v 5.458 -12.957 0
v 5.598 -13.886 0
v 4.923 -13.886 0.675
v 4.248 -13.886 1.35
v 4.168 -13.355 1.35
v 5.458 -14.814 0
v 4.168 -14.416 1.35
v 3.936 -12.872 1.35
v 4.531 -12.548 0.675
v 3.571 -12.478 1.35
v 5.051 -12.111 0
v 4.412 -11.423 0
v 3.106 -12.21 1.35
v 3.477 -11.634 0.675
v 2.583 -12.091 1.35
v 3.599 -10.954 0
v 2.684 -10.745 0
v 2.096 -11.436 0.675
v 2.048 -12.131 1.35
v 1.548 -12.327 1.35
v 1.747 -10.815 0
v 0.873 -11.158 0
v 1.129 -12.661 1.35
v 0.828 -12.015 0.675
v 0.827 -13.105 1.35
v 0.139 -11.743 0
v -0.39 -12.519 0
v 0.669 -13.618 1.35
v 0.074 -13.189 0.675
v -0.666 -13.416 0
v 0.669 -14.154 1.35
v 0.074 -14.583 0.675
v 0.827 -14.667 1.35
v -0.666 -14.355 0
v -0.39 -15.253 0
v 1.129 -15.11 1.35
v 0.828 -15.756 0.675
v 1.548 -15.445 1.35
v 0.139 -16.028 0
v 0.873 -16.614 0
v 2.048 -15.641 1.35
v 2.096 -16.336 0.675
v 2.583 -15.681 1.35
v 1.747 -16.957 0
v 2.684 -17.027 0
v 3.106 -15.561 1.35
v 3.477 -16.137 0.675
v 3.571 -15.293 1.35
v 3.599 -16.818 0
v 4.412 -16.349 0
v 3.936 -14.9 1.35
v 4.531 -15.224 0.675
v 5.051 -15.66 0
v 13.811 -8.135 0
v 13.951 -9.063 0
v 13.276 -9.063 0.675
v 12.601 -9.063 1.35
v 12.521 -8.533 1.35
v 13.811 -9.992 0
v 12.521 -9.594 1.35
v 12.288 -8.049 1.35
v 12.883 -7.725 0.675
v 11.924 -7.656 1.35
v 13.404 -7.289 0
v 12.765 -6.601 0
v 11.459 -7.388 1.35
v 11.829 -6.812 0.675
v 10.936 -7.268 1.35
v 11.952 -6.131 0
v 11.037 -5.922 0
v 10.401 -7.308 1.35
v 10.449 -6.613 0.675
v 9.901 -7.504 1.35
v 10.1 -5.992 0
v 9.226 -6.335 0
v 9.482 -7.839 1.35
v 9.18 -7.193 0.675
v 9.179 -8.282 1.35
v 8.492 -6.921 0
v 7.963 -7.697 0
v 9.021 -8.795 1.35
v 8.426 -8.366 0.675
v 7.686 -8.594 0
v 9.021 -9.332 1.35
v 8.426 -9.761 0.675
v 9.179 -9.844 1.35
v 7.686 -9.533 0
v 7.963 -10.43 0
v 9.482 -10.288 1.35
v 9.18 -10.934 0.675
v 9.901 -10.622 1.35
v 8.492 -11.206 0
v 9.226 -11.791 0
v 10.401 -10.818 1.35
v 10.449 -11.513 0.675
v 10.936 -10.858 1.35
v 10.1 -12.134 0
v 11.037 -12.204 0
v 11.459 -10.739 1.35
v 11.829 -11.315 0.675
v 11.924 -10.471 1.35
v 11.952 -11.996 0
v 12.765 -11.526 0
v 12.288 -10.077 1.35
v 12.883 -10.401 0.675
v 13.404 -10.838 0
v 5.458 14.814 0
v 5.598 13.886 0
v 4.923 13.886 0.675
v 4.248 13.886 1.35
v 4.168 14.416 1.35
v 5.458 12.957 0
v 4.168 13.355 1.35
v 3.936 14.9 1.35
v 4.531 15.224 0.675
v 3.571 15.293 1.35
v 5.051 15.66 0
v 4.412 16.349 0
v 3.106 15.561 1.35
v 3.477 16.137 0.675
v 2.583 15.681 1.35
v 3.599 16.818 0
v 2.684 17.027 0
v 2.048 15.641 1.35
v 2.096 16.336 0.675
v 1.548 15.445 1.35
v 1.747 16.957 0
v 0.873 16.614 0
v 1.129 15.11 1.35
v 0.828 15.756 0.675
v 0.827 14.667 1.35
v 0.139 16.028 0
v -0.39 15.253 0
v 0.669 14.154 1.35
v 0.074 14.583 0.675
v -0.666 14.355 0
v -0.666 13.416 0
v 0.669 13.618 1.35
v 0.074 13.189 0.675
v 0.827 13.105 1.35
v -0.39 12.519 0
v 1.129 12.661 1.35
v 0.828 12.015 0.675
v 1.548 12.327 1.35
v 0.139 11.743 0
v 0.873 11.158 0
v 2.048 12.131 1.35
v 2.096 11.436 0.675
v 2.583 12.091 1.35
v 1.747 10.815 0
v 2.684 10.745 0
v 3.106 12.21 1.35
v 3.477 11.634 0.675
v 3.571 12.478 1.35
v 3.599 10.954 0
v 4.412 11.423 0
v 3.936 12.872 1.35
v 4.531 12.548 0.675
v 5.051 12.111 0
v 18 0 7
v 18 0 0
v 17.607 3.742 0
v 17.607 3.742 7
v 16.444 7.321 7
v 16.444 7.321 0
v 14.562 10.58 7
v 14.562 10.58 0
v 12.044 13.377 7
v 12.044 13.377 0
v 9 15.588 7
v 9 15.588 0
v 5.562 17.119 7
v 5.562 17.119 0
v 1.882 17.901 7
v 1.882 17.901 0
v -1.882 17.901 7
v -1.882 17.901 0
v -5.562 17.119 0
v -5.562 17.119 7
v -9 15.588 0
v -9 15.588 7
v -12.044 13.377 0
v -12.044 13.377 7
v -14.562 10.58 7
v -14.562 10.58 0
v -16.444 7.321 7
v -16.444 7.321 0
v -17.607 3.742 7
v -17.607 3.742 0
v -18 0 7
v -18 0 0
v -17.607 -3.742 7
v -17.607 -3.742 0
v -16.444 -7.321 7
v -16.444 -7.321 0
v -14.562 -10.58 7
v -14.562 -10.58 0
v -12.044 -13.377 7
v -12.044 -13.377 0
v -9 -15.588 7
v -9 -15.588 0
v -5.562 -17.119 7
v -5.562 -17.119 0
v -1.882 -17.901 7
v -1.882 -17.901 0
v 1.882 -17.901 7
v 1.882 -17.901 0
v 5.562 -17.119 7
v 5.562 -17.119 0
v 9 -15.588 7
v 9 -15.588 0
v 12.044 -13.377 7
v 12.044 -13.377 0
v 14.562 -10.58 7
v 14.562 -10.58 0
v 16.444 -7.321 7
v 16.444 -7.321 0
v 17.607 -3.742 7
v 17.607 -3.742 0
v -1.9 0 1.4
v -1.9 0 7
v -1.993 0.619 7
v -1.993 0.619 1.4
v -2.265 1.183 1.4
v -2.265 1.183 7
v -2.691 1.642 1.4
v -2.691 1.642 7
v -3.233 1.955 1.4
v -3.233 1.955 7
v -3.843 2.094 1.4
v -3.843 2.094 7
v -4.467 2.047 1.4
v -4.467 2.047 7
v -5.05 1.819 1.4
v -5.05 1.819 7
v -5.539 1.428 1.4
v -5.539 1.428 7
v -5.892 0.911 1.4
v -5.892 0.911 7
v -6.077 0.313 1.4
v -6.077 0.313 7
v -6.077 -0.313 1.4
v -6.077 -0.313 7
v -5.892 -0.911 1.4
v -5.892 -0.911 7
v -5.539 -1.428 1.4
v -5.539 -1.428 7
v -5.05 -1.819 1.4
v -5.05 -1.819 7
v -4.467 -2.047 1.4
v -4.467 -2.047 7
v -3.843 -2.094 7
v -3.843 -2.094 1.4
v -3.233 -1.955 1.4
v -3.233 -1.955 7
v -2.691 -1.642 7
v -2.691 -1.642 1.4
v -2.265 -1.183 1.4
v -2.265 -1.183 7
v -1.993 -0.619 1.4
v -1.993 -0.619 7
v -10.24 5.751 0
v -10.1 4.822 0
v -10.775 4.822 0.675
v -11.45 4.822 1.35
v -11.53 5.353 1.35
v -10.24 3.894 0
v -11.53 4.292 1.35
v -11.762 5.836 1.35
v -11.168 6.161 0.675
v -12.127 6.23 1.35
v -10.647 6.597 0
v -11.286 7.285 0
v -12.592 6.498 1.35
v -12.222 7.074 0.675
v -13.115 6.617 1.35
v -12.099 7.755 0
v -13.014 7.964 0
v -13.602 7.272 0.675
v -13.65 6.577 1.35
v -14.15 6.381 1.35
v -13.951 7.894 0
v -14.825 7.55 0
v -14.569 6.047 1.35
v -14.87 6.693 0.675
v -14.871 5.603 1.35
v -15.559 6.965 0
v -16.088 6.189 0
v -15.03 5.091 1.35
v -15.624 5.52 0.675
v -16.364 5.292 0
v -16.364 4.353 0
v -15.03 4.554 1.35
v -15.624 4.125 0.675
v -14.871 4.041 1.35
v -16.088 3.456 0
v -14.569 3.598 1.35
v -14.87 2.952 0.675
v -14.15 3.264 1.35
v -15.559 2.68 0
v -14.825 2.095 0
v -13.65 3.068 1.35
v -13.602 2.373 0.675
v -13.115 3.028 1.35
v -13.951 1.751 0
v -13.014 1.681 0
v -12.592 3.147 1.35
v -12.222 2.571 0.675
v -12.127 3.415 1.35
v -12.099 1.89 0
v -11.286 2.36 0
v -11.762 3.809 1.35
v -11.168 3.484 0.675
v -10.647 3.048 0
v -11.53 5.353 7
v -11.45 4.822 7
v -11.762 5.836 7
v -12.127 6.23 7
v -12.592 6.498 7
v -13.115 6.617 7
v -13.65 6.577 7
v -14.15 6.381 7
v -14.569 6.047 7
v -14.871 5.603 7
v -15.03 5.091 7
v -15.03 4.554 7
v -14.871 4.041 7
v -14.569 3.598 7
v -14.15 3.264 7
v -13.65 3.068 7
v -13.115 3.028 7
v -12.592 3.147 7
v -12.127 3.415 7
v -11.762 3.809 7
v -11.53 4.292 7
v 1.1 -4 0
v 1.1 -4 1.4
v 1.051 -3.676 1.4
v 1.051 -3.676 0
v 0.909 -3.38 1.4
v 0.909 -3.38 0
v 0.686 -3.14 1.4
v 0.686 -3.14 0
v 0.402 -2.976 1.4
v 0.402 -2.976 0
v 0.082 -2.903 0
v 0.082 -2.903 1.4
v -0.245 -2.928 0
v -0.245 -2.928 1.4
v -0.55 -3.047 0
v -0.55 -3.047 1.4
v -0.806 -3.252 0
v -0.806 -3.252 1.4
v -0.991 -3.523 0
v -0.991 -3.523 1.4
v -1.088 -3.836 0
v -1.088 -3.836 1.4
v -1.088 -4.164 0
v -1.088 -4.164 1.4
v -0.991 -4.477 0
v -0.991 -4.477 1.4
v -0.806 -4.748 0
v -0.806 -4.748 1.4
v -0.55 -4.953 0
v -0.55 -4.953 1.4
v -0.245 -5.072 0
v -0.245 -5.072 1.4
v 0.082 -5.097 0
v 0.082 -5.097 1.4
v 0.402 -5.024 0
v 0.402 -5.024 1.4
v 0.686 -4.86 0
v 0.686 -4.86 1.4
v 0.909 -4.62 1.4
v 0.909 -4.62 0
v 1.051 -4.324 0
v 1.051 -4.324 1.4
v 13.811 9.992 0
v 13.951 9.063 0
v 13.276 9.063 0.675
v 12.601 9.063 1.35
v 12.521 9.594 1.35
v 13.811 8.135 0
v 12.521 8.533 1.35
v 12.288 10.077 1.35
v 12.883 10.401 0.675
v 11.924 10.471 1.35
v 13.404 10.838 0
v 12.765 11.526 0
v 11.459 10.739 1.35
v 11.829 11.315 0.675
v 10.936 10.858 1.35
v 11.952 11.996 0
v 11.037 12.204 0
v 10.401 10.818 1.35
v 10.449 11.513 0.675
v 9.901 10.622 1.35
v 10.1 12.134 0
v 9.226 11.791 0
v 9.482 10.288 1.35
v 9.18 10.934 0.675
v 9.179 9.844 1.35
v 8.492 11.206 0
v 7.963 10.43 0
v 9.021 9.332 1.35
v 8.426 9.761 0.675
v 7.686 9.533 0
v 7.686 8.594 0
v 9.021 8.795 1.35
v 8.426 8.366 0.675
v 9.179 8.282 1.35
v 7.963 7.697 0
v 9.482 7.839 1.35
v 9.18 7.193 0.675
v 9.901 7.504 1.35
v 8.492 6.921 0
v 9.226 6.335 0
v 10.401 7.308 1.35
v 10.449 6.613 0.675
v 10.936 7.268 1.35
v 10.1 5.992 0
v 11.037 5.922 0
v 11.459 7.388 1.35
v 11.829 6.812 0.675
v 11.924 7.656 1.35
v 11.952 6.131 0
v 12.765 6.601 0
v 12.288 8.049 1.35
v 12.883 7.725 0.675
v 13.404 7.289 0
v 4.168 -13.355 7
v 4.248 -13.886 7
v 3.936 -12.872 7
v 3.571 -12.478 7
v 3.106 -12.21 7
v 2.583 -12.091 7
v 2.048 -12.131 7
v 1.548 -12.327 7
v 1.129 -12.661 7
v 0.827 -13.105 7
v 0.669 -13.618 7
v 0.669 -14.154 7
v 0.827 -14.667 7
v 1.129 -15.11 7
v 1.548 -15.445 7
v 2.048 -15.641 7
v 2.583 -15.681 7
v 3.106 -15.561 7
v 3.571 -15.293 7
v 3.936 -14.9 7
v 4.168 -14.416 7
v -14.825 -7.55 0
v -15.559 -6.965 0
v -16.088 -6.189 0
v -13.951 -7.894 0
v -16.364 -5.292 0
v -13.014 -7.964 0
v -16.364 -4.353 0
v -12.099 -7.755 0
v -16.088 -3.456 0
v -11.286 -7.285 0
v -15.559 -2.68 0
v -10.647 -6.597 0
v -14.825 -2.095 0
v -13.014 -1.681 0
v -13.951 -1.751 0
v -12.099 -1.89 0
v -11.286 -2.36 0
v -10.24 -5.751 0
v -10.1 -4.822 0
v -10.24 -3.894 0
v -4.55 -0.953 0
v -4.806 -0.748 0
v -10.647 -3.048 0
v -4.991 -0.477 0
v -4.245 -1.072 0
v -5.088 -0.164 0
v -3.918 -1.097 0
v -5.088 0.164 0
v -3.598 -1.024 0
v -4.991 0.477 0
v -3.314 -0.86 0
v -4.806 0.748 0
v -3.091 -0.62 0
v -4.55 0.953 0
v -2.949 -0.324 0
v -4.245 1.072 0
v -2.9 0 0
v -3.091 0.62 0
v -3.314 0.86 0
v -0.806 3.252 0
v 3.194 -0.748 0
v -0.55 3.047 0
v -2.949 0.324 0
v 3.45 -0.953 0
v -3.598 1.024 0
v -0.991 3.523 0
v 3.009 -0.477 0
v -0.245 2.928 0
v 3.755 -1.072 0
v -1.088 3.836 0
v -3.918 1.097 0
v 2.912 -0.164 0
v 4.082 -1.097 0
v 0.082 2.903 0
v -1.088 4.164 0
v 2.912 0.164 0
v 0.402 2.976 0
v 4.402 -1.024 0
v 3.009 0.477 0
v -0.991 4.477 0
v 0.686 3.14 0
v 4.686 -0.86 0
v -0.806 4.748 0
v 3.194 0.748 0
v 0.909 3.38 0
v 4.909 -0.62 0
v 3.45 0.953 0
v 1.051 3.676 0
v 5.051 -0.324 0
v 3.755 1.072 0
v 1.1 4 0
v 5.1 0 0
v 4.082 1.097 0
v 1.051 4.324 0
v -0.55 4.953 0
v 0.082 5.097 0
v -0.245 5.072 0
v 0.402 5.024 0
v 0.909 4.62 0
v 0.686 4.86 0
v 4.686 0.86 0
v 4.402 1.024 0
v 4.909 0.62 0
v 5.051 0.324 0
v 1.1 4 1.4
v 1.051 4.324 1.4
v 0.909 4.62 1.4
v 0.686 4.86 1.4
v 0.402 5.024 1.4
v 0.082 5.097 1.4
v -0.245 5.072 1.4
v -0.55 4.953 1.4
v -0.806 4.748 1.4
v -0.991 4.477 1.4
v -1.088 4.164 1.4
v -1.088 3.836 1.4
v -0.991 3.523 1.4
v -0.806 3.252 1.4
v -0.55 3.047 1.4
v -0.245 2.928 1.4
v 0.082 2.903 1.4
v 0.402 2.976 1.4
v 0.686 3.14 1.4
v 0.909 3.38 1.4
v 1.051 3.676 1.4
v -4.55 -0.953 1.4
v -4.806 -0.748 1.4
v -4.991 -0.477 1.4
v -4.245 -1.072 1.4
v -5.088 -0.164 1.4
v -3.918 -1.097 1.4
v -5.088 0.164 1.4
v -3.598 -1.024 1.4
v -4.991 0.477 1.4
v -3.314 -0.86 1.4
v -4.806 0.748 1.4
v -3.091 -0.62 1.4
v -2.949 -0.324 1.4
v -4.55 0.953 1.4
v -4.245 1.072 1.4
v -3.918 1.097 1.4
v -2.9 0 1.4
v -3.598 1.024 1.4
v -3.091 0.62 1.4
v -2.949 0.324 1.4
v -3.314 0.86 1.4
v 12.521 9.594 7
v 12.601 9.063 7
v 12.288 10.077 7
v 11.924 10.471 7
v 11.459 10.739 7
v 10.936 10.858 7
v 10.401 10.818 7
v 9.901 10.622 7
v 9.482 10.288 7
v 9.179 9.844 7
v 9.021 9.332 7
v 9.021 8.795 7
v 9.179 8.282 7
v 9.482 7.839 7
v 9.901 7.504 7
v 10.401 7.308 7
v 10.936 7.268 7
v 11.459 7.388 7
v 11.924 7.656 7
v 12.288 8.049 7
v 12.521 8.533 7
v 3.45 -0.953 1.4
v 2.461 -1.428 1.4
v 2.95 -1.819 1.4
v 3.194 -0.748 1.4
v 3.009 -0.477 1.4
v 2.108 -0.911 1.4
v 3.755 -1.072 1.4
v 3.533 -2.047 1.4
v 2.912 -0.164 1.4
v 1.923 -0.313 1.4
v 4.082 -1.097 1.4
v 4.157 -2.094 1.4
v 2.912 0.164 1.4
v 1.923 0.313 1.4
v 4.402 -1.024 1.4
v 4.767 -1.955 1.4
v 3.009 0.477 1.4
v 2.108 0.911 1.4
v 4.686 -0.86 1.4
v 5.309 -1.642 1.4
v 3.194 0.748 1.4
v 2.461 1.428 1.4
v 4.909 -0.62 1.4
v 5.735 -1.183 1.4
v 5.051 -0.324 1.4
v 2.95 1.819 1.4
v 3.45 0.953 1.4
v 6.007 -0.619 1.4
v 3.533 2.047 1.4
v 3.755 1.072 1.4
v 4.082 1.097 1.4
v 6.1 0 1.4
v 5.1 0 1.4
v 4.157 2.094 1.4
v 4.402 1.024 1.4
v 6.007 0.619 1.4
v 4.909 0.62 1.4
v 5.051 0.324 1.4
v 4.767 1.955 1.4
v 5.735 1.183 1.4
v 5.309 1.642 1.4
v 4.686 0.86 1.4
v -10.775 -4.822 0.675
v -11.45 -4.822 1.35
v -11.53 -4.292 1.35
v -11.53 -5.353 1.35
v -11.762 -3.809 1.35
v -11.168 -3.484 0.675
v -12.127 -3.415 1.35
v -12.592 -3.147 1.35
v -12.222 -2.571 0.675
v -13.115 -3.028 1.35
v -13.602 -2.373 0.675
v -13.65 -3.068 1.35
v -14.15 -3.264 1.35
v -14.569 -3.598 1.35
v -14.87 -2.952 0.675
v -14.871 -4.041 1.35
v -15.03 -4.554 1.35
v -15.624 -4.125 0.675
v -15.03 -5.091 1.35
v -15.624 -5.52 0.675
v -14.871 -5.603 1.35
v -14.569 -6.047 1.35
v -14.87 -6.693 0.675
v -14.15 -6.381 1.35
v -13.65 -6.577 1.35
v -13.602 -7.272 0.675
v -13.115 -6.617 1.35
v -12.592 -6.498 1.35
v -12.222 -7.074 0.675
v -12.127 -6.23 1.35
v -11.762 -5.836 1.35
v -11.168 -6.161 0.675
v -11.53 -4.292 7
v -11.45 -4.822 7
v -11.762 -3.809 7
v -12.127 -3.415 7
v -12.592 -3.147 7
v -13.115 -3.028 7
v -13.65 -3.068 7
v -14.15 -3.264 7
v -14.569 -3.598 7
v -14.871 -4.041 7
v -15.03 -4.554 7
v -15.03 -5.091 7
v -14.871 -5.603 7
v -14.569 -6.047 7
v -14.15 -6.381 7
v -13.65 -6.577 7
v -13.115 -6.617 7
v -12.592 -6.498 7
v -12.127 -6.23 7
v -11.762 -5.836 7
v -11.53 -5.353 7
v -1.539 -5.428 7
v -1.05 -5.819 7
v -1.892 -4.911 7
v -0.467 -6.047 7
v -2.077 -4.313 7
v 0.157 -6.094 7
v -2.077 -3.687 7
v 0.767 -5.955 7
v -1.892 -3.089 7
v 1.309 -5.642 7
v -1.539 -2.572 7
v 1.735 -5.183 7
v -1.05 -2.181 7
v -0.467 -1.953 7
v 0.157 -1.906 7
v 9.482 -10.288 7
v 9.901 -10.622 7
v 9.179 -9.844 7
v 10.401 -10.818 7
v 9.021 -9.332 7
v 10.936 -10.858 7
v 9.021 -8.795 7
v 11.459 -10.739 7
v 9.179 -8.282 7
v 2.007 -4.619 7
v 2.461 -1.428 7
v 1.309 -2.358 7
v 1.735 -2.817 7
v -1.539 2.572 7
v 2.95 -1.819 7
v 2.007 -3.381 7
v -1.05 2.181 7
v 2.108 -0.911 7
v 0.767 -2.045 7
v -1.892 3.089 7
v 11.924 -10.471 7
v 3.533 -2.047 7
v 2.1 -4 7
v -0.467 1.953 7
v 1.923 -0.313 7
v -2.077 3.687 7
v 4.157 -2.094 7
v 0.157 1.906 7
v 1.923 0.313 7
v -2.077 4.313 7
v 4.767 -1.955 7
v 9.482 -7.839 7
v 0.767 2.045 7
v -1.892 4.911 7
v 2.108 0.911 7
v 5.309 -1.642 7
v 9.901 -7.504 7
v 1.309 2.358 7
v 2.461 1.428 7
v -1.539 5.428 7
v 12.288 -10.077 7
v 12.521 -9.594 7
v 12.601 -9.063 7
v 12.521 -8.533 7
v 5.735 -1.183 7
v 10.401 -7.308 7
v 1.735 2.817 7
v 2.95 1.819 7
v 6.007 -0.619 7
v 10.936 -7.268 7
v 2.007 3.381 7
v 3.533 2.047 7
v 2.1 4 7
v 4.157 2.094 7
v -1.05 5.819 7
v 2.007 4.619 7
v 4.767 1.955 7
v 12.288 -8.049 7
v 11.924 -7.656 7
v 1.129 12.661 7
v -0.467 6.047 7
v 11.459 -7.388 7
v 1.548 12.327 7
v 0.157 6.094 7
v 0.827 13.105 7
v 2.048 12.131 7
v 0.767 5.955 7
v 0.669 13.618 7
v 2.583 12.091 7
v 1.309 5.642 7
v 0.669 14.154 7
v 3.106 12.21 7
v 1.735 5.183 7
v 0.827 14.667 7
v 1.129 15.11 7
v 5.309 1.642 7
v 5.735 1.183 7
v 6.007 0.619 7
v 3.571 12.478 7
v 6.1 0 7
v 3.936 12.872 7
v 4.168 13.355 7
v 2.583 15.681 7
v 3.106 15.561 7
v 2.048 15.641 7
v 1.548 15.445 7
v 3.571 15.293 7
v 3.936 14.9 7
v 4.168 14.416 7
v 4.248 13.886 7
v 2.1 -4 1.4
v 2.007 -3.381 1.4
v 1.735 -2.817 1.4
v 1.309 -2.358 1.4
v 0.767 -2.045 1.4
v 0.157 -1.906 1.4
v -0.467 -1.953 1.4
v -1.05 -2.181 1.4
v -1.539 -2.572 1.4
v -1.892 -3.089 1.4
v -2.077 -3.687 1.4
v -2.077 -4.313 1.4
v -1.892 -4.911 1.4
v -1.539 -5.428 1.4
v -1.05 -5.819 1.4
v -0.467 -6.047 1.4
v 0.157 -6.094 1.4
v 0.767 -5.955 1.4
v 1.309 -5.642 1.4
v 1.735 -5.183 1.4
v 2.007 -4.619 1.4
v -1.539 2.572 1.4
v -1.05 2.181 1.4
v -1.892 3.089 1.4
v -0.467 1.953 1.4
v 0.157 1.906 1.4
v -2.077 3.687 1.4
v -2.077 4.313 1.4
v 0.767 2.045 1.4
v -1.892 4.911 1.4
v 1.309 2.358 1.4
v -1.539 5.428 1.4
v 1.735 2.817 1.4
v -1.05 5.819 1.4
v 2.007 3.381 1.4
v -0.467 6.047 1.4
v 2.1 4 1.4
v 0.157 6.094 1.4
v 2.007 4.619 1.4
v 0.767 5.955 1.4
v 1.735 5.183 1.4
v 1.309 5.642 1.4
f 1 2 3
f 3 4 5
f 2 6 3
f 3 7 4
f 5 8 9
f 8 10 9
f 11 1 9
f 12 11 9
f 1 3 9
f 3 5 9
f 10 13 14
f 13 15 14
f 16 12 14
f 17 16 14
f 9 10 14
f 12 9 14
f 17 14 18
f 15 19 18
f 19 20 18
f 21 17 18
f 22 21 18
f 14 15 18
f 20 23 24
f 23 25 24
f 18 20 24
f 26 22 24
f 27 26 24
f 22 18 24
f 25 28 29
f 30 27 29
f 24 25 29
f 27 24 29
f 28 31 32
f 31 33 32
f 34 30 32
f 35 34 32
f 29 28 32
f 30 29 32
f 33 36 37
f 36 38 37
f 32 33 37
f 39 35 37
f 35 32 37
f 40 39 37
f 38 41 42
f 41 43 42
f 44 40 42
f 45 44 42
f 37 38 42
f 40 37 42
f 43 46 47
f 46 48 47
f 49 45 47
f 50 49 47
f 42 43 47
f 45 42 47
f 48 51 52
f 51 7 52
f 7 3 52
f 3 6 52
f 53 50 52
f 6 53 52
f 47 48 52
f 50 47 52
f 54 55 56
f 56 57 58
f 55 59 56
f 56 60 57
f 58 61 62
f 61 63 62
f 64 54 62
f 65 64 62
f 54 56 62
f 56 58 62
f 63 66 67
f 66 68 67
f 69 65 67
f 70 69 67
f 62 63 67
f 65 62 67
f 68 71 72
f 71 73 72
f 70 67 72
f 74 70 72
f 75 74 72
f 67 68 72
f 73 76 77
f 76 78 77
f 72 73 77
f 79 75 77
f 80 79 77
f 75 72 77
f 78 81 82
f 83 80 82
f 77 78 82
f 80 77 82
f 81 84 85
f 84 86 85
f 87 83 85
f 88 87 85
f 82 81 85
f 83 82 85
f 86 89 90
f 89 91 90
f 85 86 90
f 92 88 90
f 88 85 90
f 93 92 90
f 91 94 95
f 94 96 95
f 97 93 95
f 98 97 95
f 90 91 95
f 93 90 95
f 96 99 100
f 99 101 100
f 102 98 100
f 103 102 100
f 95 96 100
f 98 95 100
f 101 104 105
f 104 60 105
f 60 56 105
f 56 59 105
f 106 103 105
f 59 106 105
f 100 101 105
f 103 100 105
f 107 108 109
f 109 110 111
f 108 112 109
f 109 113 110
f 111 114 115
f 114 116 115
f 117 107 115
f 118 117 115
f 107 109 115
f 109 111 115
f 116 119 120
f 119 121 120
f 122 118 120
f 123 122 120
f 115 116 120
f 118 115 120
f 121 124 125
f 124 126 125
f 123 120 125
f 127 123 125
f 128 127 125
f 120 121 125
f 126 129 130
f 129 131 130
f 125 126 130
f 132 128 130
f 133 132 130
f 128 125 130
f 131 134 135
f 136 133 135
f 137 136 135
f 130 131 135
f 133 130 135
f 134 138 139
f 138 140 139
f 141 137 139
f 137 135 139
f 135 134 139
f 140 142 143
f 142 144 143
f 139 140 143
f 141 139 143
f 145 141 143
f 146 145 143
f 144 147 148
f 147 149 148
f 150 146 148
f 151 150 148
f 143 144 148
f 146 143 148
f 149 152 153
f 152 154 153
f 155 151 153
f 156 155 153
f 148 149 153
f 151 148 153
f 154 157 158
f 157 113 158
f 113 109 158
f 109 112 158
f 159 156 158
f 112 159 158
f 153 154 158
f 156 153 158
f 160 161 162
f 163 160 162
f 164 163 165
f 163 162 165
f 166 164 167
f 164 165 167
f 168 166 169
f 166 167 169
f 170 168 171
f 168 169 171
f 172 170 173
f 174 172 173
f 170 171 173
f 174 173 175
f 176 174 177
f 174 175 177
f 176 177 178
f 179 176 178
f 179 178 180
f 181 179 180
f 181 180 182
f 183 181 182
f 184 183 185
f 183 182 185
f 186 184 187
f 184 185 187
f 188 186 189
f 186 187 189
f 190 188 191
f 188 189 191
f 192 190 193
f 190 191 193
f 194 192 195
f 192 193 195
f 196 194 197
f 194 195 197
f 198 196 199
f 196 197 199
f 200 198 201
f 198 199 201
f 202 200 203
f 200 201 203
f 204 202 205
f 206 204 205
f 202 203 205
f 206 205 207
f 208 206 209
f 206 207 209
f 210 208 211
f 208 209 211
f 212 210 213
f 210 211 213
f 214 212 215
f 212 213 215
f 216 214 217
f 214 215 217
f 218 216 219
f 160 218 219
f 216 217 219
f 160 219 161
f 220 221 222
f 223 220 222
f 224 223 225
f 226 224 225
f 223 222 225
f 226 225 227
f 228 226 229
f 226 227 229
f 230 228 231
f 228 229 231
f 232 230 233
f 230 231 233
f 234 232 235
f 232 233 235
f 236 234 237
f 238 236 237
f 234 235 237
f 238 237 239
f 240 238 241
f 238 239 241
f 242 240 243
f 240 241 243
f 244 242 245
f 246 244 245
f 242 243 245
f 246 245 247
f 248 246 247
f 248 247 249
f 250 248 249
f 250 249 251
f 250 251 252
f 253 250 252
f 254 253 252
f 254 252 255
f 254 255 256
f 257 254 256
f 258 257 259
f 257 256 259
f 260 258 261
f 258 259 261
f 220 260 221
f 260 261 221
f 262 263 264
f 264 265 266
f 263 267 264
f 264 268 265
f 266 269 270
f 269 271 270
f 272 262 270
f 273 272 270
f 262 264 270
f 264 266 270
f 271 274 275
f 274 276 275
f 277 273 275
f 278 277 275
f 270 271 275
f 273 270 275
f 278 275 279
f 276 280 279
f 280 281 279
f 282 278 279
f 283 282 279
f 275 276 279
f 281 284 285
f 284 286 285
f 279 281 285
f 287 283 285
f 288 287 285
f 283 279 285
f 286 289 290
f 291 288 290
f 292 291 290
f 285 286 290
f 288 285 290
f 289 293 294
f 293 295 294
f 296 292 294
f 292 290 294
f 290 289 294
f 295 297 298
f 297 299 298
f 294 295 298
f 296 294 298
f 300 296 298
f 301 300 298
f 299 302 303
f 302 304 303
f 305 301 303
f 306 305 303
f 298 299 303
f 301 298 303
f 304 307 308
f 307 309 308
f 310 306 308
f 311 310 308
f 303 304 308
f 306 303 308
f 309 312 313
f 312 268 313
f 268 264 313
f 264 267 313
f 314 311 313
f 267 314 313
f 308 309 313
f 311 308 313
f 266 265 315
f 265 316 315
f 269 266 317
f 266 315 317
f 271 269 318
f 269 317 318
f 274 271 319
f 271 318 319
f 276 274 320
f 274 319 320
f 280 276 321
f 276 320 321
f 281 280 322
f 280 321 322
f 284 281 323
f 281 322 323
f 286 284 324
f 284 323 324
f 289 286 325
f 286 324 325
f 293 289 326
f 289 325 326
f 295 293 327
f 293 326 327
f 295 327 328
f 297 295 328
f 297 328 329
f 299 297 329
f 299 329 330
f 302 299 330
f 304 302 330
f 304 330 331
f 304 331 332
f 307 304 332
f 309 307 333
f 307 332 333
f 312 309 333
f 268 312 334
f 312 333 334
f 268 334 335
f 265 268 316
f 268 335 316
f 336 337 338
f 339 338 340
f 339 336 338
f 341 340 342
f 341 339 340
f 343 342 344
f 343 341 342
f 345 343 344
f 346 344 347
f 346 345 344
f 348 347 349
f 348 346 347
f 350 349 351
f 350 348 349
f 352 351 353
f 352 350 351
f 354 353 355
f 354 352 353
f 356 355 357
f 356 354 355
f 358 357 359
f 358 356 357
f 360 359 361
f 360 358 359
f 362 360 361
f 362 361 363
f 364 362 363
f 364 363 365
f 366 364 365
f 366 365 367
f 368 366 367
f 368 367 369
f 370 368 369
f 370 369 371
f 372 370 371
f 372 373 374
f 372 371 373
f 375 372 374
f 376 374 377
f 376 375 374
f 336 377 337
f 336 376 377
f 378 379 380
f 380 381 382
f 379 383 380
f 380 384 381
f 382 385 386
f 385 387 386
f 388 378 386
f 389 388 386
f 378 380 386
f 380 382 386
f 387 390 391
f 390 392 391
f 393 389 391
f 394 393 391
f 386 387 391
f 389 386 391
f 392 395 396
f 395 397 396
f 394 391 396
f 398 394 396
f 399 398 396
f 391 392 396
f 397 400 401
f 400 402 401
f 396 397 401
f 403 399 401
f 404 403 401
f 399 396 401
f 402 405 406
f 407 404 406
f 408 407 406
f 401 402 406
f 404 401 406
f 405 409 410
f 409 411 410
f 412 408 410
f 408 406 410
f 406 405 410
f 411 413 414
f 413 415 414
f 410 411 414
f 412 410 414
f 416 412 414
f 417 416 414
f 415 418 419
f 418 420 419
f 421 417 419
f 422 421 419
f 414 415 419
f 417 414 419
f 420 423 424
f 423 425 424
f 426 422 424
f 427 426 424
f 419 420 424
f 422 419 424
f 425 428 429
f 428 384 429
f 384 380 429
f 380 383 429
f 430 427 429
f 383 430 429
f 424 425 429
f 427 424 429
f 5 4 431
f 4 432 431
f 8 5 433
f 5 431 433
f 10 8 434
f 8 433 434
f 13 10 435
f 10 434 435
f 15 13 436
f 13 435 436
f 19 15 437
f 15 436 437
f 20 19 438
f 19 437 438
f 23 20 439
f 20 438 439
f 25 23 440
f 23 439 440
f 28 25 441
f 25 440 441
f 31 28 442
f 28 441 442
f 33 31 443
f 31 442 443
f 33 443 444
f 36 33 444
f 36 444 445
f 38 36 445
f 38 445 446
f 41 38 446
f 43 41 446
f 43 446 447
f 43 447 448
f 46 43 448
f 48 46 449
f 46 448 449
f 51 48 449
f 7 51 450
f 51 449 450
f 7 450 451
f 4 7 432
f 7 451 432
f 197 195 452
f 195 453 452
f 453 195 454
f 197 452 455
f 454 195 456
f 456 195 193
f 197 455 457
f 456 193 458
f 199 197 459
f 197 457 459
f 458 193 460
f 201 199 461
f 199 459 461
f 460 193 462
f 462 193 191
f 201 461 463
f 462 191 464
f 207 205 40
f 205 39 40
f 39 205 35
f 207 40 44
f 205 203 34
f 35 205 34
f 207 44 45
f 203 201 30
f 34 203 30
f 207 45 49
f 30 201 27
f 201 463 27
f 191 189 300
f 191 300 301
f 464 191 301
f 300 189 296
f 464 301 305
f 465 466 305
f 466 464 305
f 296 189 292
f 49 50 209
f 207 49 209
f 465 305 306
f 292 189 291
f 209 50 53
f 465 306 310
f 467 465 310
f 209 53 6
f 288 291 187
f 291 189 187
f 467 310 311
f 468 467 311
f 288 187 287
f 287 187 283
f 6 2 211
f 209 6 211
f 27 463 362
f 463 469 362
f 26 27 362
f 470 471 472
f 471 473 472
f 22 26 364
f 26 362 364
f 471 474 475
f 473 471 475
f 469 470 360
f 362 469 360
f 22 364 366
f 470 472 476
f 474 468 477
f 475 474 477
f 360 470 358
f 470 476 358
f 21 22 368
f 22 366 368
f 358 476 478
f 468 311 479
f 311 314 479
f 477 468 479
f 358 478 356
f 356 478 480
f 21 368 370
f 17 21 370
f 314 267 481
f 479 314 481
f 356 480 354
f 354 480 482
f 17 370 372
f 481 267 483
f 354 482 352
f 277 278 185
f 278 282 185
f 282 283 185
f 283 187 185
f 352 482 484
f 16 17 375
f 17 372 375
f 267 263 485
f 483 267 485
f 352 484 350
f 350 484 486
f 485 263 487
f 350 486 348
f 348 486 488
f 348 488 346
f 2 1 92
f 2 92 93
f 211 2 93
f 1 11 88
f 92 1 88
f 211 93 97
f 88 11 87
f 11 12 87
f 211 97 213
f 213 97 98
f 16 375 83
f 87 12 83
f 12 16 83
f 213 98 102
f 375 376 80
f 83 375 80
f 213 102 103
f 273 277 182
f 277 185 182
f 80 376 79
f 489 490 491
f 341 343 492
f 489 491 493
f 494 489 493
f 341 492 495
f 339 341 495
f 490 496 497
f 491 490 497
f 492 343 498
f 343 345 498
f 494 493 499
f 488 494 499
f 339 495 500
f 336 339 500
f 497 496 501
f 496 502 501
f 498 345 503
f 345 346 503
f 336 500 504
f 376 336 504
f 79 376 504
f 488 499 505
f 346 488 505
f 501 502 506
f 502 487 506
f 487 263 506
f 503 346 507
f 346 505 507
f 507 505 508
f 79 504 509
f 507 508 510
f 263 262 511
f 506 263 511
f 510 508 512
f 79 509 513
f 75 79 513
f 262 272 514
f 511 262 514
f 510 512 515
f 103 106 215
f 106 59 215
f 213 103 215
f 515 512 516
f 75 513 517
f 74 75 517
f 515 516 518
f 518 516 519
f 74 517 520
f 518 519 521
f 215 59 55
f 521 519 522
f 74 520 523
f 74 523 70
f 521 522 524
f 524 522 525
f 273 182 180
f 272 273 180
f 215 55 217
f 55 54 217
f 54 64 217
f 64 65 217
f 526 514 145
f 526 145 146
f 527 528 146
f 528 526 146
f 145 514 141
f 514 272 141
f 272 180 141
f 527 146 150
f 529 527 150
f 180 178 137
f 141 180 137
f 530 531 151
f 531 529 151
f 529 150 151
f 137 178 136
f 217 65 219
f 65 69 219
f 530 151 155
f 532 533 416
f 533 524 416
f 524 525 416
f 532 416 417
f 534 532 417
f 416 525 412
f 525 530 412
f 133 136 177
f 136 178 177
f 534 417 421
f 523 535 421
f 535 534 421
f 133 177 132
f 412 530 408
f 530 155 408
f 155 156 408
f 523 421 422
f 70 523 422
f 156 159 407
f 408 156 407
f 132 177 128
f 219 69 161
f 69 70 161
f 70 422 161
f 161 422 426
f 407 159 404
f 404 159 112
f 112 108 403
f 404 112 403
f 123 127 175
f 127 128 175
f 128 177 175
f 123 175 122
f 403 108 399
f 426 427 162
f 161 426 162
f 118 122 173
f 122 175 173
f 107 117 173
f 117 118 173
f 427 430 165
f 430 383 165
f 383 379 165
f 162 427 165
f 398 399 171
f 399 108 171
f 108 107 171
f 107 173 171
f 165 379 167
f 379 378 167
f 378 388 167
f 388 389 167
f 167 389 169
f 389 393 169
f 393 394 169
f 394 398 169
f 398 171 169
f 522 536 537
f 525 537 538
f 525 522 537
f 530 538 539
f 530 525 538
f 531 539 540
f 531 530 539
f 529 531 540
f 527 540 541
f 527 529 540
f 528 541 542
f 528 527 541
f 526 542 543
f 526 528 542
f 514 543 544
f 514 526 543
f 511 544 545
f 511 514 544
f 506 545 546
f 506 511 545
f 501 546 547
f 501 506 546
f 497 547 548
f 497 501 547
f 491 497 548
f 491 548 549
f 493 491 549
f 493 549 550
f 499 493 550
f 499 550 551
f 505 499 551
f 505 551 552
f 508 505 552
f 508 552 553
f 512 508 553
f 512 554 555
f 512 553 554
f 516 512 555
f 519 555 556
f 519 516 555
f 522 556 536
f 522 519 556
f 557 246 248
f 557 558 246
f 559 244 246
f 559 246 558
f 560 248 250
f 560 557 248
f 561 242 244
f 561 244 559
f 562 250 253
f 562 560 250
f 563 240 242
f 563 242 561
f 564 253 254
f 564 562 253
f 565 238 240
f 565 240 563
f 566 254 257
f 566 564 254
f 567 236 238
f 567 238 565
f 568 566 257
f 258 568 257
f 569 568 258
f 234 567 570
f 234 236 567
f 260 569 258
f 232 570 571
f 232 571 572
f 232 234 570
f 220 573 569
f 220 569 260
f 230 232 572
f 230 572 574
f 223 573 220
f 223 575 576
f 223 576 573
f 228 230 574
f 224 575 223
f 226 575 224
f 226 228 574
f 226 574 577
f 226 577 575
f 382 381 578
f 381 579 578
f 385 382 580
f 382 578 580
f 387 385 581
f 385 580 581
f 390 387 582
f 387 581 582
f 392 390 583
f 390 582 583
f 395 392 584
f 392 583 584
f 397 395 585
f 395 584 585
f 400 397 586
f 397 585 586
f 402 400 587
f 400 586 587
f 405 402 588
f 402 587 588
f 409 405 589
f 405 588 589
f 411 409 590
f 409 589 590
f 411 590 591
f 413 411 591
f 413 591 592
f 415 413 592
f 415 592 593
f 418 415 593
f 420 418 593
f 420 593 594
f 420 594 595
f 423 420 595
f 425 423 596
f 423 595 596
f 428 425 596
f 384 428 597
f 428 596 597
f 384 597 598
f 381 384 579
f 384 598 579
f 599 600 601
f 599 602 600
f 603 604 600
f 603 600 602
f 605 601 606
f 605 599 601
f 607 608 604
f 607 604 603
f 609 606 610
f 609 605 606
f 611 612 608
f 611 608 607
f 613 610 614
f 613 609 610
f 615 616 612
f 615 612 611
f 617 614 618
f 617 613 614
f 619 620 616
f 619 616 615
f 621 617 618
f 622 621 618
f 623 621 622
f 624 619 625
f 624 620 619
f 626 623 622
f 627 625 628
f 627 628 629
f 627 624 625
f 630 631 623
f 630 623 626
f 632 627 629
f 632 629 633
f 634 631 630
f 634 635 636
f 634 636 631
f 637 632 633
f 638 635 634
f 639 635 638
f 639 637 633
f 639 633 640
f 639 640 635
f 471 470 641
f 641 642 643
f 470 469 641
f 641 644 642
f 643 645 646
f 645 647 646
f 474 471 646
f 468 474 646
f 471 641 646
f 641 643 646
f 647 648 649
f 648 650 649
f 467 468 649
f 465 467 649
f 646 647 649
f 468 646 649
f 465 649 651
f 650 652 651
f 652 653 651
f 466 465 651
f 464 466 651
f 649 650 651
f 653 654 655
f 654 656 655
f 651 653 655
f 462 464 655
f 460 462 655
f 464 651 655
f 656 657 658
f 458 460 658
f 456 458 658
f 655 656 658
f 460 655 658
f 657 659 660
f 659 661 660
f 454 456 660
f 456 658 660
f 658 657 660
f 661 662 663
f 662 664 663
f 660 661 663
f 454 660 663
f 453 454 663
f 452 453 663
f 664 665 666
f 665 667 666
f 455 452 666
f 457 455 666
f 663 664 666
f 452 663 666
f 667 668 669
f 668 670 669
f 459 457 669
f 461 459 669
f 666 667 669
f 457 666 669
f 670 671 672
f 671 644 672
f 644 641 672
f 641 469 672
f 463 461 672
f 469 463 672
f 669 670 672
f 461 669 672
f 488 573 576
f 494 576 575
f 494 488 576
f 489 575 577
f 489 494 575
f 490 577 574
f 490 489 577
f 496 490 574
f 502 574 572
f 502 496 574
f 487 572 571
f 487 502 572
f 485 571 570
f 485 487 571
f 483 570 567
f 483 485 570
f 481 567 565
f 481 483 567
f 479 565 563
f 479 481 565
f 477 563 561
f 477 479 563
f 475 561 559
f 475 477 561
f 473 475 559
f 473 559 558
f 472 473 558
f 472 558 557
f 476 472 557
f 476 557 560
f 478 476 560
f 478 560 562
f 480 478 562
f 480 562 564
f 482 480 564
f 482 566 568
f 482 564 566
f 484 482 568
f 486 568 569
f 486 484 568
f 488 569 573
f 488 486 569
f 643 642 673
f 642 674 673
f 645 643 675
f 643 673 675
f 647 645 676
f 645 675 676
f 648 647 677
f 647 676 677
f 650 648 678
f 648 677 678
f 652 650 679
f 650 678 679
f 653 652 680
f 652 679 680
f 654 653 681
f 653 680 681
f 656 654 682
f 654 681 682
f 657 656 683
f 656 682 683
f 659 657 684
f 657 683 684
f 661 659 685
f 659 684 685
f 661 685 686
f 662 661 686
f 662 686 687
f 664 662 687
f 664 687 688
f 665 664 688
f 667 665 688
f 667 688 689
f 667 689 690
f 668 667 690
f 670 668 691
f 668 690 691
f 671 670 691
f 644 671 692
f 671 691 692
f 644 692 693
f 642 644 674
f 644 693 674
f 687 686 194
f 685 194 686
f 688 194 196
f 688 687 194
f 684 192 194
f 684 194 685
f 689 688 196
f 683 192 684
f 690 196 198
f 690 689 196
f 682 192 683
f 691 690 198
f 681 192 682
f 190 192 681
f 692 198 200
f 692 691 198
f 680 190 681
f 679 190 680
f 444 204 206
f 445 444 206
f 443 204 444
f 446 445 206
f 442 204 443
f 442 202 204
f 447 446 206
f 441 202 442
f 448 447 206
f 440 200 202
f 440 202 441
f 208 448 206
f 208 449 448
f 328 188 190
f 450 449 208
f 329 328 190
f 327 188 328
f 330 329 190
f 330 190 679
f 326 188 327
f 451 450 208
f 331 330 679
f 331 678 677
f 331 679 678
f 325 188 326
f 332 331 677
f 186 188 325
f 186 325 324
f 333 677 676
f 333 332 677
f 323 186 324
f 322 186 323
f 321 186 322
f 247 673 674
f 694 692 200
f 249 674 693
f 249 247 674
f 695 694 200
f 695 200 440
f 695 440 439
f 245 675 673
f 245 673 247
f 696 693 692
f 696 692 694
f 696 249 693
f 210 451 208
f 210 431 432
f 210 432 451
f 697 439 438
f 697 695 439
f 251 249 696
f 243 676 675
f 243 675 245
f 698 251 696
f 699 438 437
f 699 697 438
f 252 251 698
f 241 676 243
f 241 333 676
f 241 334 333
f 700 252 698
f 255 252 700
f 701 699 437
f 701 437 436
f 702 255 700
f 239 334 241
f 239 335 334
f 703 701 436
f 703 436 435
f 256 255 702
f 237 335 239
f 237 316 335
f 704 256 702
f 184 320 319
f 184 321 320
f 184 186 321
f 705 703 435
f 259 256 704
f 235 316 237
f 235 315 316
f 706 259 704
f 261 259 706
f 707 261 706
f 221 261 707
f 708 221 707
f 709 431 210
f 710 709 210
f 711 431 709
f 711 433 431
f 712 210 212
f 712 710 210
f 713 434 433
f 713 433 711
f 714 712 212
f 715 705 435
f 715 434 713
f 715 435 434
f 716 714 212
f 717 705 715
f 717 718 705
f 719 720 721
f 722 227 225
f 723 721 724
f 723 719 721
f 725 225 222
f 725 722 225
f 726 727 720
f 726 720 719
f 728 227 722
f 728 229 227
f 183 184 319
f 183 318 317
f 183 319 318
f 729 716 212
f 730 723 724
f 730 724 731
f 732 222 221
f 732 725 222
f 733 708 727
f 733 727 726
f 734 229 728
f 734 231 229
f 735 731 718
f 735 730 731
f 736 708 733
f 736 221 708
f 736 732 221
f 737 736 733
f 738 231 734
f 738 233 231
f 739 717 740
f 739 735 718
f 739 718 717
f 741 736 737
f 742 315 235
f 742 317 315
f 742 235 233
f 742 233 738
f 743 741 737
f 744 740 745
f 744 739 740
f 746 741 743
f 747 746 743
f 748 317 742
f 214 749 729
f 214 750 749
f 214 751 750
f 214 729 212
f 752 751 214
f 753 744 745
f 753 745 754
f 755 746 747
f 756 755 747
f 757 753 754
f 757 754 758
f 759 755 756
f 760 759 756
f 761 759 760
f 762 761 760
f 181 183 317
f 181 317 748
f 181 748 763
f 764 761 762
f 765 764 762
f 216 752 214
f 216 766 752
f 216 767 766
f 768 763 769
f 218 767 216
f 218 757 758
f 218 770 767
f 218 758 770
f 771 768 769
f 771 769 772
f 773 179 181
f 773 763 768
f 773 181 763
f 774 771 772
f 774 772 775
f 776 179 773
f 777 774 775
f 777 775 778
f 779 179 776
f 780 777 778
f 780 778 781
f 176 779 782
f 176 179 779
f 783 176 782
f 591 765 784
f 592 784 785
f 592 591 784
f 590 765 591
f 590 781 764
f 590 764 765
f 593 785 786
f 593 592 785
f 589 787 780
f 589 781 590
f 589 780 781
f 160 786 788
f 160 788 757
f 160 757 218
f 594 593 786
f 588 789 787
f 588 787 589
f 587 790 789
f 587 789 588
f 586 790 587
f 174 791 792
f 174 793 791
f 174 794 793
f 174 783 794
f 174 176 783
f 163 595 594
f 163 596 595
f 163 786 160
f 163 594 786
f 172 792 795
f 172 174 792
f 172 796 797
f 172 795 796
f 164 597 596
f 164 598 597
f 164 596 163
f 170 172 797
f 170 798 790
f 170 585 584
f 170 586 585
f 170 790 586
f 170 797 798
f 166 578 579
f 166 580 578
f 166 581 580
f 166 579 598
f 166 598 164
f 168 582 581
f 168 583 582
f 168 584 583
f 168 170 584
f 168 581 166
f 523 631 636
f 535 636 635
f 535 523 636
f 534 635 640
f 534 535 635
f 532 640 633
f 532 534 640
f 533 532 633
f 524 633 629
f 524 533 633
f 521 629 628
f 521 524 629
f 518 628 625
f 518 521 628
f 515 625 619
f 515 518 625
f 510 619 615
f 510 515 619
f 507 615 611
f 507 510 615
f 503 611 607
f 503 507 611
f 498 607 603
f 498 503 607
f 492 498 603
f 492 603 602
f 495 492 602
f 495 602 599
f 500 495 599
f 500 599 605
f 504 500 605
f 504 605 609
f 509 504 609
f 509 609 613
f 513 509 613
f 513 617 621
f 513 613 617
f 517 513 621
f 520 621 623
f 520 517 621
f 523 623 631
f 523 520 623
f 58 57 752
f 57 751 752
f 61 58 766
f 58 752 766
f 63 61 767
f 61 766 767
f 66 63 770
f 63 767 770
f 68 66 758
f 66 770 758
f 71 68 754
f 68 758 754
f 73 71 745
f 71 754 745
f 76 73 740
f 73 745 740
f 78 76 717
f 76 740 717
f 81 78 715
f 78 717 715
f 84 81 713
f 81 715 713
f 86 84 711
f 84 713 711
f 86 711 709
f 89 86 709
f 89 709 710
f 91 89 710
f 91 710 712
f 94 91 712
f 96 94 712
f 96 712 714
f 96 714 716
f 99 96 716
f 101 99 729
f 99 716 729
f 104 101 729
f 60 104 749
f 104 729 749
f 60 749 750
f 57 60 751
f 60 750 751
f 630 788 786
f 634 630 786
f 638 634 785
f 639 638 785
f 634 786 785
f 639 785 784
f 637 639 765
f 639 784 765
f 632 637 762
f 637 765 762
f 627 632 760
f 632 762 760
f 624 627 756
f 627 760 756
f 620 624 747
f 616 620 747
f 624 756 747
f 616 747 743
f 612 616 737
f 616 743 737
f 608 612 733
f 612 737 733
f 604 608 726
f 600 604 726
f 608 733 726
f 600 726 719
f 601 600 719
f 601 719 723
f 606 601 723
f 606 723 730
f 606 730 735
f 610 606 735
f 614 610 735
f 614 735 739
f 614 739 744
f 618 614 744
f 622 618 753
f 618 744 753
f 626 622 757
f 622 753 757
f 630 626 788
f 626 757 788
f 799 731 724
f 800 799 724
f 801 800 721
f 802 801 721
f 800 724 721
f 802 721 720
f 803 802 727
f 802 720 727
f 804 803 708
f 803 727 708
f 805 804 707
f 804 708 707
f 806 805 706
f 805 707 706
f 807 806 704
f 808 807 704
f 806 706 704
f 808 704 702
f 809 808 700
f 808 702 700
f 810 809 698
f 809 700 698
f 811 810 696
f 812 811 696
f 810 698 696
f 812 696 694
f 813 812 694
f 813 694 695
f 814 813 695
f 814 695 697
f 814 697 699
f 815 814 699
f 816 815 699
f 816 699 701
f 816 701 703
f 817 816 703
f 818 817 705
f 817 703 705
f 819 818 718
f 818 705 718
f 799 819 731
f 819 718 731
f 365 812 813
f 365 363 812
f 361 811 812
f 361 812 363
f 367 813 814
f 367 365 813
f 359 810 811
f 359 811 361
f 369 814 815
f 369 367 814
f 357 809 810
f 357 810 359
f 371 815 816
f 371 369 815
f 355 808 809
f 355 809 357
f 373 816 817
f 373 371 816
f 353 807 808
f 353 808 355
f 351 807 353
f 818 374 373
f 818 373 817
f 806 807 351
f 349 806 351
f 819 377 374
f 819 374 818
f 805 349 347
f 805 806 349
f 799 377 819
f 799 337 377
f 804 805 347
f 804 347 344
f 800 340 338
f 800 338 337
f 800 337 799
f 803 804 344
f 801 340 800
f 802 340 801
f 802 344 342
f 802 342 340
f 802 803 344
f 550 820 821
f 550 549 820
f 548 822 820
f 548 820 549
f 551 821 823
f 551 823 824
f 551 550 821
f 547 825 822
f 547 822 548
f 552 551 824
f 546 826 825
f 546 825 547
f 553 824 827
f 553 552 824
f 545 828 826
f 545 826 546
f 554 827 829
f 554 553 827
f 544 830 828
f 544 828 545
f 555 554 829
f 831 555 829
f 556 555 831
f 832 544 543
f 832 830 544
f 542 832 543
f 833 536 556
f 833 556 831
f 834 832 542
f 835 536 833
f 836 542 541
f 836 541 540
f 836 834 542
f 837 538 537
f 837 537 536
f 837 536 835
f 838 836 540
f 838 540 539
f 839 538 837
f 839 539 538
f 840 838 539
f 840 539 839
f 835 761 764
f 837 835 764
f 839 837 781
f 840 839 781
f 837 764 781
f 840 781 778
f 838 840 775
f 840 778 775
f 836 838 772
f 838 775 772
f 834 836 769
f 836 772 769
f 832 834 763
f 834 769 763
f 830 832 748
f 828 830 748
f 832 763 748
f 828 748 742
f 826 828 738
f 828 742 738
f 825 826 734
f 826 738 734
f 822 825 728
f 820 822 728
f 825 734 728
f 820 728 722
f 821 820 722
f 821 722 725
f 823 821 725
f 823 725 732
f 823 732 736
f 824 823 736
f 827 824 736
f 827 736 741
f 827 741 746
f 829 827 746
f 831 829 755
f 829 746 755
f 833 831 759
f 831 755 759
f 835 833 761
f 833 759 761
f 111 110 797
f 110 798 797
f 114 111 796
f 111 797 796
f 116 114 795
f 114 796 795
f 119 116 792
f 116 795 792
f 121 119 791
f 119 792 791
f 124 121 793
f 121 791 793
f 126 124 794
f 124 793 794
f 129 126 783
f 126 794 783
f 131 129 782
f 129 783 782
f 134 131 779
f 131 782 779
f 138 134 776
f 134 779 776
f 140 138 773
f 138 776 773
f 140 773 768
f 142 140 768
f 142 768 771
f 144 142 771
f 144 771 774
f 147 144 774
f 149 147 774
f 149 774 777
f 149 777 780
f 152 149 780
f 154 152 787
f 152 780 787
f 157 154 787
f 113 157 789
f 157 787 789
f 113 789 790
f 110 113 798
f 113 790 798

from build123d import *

# Parameters (mm, degrees)
SKETCH_1_R                   = 18
SKETCH_1_R_2                 = 1.1
SKETCH_1_R_3                 = 1.6
EXTRUDE_1_DEPTH              = 7
SKETCH_5_R                   = 2.1
CUT_EXTRUDE_1_DEPTH          = 5.6
HOLE_WIZARD_M3_2_D           = 3.6
HOLE_WIZARD_M3_2_CSINK_D     = 6.3
HOLE_WIZARD_M3_2_CSINK_ANGLE = 90


with BuildPart() as part:
    # 스케치1 → 보스-돌출1 (new body)
    with BuildSketch(Plane.XY):
        Circle(SKETCH_1_R)
        with Locations((0, 4)):
            Circle(SKETCH_1_R_2, mode=Mode.SUBTRACT)
        with Locations((4, 0)):
            Circle(SKETCH_1_R_2, mode=Mode.SUBTRACT)
        with Locations((0, -4)):
            Circle(SKETCH_1_R_2, mode=Mode.SUBTRACT)
        with Locations((-4, 0)):
            Circle(SKETCH_1_R_2, mode=Mode.SUBTRACT)
        with Locations((-13.249665953, 4.822484021)):
            Circle(SKETCH_1_R_3, mode=Mode.SUBTRACT)
        with Locations((-13.249665953, -4.822484021)):
            Circle(SKETCH_1_R_3, mode=Mode.SUBTRACT)
        with Locations((10.801226648, 9.063305297)):
            Circle(SKETCH_1_R_3, mode=Mode.SUBTRACT)
        with Locations((2.448439305, 13.885789317)):
            Circle(SKETCH_1_R_3, mode=Mode.SUBTRACT)
        with Locations((2.448439305, -13.885789317)):
            Circle(SKETCH_1_R_3, mode=Mode.SUBTRACT)
        with Locations((10.801226648, -9.063305297)):
            Circle(SKETCH_1_R_3, mode=Mode.SUBTRACT)
    extrude(amount=EXTRUDE_1_DEPTH)

    # 스케치5 → 컷-돌출1 (cut)
    with BuildSketch(Plane.XY.offset(7)):
        with Locations((0, 4)):
            Circle(SKETCH_5_R)
        with Locations((0, -4)):
            Circle(SKETCH_5_R)
        with Locations((4, 0)):
            Circle(SKETCH_5_R)
        with Locations((-4, 0)):
            Circle(SKETCH_5_R)
    extrude(amount=-CUT_EXTRUDE_1_DEPTH, mode=Mode.SUBTRACT)

    # M3 접시 머리 나사용 카운터싱크2 (through all)
    with Locations(Plane(origin=(0, 0, 0), x_dir=(-1, 0, 0), z_dir=(0, 0, -1))):
        with Locations((-2.448439305, 13.885789317), (13.249665953, 4.822484021), (13.249665953, -4.822484021), (-2.448439305, -13.885789317), (-10.801226648, -9.063305297), (-10.801226648, 9.063305297)):
            CounterSinkHole(HOLE_WIZARD_M3_2_D / 2, HOLE_WIZARD_M3_2_CSINK_D / 2, counter_sink_angle=HOLE_WIZARD_M3_2_CSINK_ANGLE)


solid = part.part
